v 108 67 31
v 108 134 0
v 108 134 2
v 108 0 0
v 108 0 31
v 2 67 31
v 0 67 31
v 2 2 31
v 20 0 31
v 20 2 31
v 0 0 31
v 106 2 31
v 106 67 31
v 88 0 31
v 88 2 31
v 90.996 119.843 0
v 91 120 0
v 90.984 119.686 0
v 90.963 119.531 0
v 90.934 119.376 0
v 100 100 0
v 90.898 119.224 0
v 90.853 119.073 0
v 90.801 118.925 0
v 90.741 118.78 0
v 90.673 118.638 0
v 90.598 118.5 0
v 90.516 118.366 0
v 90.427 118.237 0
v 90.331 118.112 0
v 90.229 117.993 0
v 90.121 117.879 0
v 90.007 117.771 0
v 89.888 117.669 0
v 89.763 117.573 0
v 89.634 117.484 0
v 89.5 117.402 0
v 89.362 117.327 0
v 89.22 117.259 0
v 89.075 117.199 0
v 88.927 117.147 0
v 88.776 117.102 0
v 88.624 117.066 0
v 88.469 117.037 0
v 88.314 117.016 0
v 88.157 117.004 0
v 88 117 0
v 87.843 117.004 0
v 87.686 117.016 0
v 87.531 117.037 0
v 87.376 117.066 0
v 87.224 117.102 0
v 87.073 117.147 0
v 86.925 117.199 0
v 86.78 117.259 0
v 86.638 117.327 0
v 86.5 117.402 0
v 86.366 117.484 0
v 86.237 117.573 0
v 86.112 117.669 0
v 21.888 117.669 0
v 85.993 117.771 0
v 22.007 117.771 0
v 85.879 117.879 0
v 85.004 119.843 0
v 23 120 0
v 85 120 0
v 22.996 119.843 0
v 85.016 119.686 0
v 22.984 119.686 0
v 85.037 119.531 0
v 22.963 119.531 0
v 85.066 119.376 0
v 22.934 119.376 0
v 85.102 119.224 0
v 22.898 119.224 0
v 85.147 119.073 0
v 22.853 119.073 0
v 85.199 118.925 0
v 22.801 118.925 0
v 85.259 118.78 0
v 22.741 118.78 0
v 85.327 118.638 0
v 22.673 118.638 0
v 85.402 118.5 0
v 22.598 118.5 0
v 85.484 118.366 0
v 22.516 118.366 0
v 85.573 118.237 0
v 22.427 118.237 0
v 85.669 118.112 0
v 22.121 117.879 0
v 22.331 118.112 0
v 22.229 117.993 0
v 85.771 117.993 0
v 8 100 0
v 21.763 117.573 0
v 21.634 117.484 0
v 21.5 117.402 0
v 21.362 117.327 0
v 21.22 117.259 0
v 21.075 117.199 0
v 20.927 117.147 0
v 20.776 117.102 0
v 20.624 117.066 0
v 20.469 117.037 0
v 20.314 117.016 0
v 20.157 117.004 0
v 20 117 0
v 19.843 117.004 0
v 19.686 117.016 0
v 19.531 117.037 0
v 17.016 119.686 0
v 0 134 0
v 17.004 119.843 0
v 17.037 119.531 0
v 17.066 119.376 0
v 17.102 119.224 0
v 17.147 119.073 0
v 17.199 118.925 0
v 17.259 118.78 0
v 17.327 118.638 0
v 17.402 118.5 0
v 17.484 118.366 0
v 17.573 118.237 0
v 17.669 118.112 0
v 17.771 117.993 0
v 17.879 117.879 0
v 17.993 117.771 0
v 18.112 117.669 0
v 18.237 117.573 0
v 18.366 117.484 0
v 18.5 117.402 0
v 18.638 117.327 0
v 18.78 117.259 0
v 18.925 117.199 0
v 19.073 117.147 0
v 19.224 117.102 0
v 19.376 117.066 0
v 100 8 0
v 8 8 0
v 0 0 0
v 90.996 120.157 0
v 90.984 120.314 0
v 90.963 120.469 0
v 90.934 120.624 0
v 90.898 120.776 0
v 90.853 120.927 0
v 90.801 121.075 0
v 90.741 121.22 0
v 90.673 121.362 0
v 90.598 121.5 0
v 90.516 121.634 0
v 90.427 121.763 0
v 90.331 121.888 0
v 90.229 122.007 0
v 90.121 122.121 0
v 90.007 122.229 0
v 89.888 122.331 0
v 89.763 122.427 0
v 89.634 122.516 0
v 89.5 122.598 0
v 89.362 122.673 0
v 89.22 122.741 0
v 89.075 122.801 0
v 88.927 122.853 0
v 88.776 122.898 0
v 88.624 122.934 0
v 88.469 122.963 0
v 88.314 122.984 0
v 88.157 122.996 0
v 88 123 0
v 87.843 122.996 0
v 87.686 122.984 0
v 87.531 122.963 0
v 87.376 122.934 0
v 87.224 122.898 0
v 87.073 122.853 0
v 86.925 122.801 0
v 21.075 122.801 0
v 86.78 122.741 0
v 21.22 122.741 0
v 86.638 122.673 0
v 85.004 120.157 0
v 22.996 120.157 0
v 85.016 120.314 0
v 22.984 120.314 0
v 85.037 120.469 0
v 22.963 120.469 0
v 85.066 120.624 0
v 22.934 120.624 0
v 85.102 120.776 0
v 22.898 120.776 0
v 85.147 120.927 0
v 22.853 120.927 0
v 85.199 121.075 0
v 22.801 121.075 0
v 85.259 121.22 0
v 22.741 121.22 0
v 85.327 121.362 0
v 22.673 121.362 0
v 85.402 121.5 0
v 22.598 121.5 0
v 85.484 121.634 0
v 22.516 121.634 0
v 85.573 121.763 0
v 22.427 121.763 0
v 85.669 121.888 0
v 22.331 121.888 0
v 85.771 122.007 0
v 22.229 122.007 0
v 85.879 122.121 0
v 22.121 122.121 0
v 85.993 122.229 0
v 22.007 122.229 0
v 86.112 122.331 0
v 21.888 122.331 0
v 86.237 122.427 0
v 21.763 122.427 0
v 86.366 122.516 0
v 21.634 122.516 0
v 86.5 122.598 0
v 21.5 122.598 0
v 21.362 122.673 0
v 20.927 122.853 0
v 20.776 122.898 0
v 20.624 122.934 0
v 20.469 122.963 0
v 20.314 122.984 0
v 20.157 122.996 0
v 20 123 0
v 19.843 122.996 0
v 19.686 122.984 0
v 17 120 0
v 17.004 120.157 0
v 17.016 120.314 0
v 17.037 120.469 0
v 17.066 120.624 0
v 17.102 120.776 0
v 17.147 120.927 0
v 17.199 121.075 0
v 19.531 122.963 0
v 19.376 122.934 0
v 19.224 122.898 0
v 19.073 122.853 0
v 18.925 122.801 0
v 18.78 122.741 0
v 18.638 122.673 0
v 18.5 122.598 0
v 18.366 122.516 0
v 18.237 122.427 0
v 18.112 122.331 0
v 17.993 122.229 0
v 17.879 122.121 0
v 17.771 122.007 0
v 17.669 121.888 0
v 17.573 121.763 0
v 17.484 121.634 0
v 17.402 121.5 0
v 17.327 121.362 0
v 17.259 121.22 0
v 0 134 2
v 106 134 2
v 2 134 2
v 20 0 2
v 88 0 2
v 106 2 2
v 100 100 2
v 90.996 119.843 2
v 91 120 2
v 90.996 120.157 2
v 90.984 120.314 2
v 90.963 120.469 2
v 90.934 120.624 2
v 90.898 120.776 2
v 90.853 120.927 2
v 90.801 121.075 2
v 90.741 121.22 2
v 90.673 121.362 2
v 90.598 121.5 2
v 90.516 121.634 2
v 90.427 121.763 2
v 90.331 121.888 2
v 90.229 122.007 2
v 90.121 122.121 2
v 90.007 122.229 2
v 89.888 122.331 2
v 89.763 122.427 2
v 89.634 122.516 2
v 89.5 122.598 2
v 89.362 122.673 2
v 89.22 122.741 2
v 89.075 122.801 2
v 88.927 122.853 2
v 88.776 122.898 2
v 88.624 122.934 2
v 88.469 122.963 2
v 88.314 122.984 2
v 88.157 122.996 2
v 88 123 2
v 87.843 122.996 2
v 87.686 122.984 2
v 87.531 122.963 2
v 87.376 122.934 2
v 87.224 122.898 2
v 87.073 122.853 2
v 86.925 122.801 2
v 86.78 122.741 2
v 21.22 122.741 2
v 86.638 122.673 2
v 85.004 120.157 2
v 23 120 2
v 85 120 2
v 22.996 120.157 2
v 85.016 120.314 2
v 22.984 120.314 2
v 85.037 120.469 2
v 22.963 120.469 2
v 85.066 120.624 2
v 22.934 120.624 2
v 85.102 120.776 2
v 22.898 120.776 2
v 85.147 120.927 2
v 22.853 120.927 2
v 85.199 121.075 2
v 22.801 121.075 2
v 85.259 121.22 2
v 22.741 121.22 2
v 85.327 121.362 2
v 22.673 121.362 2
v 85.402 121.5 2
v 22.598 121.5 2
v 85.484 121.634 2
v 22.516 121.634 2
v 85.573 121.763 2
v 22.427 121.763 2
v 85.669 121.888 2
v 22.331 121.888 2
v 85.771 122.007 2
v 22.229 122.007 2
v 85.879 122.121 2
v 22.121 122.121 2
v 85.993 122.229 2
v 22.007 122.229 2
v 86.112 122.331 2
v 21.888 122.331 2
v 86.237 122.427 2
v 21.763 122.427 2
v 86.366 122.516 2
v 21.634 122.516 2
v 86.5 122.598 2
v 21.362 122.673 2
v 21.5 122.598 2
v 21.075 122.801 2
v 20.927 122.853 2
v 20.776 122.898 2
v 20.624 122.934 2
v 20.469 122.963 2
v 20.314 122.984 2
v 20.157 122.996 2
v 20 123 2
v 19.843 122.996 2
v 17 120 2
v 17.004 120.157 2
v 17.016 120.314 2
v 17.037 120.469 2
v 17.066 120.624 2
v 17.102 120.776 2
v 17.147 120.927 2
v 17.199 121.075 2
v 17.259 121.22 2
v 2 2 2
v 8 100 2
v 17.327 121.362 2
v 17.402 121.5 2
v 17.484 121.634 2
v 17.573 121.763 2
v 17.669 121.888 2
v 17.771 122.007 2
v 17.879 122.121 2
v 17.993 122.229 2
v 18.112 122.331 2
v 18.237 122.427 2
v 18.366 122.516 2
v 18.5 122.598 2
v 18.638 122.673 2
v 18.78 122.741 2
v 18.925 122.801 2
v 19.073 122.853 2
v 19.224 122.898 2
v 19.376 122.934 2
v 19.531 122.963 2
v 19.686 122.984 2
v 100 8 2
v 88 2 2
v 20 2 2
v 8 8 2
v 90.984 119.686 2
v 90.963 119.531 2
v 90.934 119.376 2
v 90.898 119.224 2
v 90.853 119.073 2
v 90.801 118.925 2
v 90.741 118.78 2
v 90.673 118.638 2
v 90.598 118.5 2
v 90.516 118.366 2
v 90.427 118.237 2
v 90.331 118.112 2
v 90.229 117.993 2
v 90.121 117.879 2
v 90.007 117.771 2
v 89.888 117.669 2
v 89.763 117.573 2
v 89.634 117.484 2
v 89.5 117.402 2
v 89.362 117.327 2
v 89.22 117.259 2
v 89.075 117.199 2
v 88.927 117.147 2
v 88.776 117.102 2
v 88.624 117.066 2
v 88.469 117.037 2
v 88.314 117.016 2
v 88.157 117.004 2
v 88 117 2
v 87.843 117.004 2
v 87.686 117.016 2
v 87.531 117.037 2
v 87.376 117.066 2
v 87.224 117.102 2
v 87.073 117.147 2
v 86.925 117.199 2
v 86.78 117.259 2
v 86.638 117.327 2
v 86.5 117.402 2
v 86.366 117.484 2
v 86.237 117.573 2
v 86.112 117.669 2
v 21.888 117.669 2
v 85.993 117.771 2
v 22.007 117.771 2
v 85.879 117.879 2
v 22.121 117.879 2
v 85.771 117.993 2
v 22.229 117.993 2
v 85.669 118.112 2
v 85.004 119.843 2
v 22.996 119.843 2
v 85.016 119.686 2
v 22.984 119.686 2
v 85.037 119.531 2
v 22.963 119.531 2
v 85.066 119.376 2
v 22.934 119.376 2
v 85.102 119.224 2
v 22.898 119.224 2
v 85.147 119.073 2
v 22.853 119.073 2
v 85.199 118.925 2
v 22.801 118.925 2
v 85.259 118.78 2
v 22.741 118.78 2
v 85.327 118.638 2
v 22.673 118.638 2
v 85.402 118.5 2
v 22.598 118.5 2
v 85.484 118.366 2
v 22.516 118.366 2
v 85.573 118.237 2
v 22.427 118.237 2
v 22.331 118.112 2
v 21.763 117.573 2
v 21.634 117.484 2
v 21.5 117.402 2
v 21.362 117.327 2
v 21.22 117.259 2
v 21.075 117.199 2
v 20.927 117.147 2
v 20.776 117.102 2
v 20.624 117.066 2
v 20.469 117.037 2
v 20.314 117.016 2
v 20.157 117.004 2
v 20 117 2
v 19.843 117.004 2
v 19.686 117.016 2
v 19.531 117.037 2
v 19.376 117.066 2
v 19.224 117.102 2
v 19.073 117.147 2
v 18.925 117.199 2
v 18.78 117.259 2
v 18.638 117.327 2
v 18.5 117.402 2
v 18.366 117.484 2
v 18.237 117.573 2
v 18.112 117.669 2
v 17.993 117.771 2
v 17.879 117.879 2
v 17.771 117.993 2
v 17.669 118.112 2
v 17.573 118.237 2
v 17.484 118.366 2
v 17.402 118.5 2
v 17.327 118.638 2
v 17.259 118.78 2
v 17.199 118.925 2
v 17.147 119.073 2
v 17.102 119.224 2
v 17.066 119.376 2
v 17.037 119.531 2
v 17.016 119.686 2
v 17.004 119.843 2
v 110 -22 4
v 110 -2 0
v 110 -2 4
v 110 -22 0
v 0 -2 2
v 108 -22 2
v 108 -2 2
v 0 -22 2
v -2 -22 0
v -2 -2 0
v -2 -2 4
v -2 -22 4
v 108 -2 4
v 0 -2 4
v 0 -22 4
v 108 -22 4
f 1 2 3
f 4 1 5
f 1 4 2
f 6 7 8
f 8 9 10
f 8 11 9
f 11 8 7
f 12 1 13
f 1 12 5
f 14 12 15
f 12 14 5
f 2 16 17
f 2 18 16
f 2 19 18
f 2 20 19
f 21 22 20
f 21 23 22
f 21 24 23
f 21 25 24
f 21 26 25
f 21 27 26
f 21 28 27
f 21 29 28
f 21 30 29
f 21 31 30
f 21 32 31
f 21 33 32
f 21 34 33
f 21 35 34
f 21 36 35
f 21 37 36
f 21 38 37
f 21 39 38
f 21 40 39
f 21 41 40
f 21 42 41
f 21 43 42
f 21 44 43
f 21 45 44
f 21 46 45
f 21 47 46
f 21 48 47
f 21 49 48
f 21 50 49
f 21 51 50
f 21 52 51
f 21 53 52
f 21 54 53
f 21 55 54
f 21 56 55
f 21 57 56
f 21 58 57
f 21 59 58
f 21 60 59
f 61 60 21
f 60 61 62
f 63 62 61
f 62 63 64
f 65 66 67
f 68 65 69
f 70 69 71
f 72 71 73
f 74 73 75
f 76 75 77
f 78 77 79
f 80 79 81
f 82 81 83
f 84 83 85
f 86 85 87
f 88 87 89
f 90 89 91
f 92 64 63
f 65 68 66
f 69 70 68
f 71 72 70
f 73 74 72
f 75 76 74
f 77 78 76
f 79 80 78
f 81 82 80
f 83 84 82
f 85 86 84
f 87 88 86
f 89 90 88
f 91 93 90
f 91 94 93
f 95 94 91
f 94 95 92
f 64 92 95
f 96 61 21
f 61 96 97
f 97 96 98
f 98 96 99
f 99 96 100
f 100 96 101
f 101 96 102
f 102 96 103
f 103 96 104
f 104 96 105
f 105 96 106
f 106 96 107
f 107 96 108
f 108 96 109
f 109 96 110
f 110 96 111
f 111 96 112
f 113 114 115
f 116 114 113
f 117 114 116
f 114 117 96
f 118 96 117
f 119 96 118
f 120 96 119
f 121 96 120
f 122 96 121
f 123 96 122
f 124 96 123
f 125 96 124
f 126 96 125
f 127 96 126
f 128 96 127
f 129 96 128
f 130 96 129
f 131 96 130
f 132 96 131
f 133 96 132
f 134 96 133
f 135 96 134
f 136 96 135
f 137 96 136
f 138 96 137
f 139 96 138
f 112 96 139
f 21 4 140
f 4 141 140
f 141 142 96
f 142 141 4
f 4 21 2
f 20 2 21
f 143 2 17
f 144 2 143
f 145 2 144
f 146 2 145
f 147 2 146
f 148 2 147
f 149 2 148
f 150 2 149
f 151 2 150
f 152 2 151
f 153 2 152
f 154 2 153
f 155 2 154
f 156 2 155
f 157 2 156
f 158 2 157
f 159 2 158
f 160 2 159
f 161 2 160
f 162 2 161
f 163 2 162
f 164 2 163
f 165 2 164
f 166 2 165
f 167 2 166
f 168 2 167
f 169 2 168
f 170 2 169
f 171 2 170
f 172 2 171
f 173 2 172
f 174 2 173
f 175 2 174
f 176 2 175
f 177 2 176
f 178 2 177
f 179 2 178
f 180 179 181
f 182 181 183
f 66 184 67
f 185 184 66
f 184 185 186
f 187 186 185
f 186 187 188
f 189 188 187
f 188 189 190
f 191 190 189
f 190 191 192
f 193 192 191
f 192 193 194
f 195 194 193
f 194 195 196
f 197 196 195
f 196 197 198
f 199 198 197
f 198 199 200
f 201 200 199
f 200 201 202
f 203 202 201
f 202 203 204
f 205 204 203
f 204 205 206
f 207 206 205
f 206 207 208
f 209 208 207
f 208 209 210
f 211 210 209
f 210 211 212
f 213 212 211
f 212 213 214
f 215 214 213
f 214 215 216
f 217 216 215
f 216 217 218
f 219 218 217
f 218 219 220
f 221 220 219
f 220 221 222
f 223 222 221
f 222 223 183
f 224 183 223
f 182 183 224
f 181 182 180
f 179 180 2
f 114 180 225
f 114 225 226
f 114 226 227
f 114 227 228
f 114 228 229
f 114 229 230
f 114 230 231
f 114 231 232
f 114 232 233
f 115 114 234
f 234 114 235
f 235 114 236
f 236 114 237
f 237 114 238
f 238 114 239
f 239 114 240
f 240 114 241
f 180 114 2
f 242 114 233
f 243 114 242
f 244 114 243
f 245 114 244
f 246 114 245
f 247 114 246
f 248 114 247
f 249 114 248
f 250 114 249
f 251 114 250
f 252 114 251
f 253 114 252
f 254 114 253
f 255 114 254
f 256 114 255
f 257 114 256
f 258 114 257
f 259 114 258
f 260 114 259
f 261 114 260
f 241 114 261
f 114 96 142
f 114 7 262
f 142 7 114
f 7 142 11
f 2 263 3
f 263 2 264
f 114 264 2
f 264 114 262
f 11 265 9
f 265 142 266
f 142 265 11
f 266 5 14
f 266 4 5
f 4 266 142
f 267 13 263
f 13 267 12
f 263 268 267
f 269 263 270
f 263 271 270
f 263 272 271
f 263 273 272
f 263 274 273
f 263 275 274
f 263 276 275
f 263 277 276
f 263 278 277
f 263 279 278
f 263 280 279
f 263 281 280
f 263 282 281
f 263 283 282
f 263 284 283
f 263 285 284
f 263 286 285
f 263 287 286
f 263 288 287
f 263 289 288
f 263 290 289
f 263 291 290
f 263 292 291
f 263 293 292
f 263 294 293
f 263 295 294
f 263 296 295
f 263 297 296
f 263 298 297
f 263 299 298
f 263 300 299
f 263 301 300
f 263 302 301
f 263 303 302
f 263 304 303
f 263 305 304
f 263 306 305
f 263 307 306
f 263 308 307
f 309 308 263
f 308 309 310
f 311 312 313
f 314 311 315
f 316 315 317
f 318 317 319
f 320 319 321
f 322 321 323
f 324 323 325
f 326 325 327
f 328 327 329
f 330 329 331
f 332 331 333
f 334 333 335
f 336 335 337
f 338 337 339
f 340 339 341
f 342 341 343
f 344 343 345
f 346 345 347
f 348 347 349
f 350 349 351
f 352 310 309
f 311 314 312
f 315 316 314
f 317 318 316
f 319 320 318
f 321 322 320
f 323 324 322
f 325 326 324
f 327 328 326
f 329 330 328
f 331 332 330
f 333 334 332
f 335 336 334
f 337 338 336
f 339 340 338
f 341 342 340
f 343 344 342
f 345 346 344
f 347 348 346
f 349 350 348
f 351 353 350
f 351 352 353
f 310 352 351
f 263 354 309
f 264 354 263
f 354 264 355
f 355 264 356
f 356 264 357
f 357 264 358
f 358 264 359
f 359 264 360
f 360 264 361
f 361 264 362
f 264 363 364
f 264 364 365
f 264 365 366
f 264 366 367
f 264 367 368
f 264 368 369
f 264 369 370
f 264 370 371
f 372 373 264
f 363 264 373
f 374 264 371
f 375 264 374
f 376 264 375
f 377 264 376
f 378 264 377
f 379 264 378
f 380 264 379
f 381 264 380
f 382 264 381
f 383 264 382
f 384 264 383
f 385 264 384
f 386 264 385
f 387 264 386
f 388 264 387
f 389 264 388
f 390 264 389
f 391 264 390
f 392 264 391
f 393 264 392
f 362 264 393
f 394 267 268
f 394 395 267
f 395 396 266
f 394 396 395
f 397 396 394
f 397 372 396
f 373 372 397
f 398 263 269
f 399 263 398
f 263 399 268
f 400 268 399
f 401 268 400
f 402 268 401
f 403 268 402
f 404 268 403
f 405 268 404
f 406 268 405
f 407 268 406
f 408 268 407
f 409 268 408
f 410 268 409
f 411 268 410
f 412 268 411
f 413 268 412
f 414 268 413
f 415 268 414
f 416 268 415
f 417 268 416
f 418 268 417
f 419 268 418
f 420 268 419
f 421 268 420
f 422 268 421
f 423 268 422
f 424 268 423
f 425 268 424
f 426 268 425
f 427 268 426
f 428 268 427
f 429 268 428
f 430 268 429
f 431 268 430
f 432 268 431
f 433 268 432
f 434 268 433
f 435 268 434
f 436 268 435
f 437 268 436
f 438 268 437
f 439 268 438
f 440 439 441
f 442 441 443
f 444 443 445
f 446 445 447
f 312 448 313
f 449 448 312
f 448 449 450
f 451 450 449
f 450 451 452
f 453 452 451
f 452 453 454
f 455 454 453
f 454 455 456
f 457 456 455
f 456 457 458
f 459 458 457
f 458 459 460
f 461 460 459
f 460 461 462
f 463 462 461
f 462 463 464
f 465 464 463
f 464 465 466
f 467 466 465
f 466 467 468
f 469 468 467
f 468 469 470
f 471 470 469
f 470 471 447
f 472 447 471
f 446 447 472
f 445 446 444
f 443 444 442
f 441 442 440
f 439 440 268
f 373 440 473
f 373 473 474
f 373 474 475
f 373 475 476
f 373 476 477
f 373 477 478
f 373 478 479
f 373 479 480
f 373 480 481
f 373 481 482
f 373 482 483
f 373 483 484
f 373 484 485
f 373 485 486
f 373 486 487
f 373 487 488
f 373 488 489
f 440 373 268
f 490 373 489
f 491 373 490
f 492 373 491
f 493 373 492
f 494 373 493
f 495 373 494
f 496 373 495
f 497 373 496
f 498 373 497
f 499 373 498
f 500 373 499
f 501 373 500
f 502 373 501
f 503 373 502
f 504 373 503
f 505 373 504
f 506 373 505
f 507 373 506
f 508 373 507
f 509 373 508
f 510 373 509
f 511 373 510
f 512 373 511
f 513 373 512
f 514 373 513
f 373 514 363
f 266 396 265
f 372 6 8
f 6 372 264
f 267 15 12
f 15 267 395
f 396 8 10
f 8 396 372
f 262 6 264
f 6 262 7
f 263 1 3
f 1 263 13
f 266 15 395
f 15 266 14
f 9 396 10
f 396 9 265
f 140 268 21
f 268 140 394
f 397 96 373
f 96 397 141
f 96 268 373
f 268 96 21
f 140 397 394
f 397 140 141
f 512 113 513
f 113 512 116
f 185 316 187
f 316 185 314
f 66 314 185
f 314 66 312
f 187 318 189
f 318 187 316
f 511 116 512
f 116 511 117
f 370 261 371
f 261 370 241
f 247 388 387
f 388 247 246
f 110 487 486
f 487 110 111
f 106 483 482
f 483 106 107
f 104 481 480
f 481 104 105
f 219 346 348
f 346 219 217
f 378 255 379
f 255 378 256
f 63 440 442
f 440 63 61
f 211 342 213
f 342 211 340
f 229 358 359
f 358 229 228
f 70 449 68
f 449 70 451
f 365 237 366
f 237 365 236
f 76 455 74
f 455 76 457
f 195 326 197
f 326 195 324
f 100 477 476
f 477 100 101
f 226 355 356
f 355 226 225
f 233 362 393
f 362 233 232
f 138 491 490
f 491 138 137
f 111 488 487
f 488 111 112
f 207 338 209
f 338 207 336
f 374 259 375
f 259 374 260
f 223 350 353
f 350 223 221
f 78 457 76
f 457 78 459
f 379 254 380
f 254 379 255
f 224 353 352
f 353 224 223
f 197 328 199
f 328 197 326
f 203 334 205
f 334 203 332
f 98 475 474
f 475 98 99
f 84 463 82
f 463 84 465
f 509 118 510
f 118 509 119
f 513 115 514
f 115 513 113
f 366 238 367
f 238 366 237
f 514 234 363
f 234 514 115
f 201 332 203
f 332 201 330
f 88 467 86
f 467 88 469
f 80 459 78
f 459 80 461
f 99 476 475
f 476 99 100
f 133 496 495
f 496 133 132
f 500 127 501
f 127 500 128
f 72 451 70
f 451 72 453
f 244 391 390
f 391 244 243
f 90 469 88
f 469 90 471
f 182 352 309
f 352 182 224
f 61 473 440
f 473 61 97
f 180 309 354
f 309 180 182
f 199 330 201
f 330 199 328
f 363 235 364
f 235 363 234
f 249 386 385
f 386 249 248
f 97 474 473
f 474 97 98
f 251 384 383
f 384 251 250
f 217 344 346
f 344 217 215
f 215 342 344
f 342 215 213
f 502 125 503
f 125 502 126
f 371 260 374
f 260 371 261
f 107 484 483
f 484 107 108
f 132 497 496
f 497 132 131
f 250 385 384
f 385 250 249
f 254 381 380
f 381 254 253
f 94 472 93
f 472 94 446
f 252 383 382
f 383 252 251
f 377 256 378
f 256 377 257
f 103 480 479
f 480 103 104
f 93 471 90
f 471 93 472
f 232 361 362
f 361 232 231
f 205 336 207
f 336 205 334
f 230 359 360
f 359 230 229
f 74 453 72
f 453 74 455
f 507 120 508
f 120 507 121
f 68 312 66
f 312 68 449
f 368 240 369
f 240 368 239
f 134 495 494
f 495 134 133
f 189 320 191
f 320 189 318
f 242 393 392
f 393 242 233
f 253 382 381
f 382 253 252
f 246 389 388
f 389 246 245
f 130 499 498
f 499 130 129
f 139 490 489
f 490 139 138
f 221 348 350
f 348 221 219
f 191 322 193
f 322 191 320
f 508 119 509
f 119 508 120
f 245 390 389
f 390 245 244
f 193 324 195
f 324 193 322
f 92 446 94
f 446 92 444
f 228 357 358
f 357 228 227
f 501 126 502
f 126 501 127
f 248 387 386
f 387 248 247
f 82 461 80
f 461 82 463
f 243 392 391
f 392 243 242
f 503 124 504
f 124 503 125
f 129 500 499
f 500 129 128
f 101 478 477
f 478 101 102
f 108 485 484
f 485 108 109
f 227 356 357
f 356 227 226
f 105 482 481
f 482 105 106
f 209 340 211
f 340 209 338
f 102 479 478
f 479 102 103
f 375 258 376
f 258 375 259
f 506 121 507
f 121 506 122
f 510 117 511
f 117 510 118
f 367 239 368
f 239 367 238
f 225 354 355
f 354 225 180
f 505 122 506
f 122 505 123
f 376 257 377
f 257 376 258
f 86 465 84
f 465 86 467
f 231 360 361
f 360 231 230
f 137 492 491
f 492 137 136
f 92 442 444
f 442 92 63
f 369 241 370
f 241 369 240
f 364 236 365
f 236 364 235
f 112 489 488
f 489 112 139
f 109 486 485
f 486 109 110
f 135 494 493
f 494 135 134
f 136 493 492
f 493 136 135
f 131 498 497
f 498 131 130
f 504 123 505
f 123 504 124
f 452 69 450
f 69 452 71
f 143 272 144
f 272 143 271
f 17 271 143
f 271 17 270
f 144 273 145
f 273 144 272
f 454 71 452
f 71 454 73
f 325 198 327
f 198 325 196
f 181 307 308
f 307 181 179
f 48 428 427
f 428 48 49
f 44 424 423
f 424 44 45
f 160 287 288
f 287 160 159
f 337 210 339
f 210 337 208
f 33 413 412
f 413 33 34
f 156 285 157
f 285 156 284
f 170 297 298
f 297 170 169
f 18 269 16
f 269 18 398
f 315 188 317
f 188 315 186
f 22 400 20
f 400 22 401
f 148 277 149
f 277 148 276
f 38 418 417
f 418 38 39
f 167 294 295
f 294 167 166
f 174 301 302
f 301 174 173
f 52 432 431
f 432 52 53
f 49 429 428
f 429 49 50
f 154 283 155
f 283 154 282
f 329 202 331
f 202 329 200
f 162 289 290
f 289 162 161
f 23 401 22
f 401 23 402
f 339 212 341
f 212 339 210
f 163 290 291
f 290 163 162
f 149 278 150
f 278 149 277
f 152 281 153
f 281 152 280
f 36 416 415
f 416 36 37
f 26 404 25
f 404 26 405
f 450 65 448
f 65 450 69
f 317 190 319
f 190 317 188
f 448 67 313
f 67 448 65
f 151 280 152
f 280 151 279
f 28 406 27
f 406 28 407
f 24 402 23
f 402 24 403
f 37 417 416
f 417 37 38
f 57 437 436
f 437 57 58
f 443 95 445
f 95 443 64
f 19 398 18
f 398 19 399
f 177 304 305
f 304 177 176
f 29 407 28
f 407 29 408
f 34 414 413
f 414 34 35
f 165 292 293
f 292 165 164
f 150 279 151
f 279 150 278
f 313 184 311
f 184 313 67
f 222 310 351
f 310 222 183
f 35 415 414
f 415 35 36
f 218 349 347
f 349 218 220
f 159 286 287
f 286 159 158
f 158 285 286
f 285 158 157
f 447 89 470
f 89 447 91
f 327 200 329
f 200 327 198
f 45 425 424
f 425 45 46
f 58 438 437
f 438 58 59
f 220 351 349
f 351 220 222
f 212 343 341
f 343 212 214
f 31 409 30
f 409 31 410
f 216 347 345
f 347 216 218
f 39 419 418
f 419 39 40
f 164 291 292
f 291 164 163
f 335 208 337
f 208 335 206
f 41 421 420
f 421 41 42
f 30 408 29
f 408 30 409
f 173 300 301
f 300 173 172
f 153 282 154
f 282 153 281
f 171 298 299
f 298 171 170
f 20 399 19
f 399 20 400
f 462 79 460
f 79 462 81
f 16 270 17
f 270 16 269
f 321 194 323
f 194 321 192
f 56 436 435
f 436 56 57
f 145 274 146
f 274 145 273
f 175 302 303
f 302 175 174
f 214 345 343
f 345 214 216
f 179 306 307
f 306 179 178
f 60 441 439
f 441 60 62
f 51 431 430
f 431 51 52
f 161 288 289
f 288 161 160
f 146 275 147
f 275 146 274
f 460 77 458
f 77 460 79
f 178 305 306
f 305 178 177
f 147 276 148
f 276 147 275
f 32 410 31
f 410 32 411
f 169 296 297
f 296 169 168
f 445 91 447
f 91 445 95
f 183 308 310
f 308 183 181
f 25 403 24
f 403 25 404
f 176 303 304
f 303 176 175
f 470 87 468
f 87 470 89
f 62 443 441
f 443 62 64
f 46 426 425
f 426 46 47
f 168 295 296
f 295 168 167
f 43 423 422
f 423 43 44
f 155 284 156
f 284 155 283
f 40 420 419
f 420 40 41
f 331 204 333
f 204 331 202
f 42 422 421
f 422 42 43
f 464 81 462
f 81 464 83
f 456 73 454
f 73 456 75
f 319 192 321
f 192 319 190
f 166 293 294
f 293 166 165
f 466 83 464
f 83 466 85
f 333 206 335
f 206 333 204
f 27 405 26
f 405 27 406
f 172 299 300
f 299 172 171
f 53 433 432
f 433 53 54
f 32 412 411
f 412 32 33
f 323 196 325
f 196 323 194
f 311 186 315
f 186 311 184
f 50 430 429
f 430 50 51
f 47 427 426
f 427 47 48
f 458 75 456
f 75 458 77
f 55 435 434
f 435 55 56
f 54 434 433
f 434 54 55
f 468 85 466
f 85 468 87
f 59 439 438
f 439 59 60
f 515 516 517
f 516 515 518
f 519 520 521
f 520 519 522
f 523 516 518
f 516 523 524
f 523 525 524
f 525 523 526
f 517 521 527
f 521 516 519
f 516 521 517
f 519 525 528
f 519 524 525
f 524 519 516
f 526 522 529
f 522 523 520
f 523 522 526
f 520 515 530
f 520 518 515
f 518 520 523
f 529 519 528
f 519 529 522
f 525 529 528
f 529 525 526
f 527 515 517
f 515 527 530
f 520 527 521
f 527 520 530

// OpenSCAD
$fn = $preview ? 6 : 120;

in_w = 104;
in_d = 27;
in_h = 130;
wall = 2;
ex_w = in_w + wall*2;
ex_d = in_d + wall*2;
ex_h = in_h + wall*2;
bak_in = wall + 6;
bot_off = 20;   //ex_w/5;
cb_w = 20;
screw = 6;

module bridge () {
    hull() {
        translate([0,0,in_d+2]) cube([wall+1,1,1]);
        translate([0,ex_h/2,in_d+2]) cube([wall+1,1,1]);
        translate([0,ex_h/2]) cube([wall+1,1,1]);
    }
}

module cross_bar () {
    cube([ex_w+wall*2, cb_w, wall]);
    translate([0,0,wall]) cube([wall,cb_w,wall]);
    translate([ex_w+wall,0,wall]) cube([wall,cb_w,wall]);
}

difference() {
    cube([ex_w, ex_h, ex_d]);
    translate([wall,wall,wall]) cube([in_w, in_h+wall+1, in_d+wall+1]);
    // bridges
    translate([-.1,ex_h/2,wall]) bridge();
    translate([in_w+1.4,ex_h/2,wall]) bridge();
    // open bottom
    translate([bot_off,-.1,wall]) cube([ex_w-bot_off*2, wall+1, in_d+wall+1]);
    // open back
    translate([bak_in,bak_in,-.1]) cube([ex_w-bak_in*2, ex_w-bak_in*2, wall+1]);
    // screw holes
    translate([bot_off,in_w+16,-.1]) cylinder(wall+1, d=screw);
    translate([ex_w-bot_off,in_w+16,-.1]) cylinder(wall+1, d=screw);
}

translate([-wall,-cb_w-2,0]) cross_bar();
